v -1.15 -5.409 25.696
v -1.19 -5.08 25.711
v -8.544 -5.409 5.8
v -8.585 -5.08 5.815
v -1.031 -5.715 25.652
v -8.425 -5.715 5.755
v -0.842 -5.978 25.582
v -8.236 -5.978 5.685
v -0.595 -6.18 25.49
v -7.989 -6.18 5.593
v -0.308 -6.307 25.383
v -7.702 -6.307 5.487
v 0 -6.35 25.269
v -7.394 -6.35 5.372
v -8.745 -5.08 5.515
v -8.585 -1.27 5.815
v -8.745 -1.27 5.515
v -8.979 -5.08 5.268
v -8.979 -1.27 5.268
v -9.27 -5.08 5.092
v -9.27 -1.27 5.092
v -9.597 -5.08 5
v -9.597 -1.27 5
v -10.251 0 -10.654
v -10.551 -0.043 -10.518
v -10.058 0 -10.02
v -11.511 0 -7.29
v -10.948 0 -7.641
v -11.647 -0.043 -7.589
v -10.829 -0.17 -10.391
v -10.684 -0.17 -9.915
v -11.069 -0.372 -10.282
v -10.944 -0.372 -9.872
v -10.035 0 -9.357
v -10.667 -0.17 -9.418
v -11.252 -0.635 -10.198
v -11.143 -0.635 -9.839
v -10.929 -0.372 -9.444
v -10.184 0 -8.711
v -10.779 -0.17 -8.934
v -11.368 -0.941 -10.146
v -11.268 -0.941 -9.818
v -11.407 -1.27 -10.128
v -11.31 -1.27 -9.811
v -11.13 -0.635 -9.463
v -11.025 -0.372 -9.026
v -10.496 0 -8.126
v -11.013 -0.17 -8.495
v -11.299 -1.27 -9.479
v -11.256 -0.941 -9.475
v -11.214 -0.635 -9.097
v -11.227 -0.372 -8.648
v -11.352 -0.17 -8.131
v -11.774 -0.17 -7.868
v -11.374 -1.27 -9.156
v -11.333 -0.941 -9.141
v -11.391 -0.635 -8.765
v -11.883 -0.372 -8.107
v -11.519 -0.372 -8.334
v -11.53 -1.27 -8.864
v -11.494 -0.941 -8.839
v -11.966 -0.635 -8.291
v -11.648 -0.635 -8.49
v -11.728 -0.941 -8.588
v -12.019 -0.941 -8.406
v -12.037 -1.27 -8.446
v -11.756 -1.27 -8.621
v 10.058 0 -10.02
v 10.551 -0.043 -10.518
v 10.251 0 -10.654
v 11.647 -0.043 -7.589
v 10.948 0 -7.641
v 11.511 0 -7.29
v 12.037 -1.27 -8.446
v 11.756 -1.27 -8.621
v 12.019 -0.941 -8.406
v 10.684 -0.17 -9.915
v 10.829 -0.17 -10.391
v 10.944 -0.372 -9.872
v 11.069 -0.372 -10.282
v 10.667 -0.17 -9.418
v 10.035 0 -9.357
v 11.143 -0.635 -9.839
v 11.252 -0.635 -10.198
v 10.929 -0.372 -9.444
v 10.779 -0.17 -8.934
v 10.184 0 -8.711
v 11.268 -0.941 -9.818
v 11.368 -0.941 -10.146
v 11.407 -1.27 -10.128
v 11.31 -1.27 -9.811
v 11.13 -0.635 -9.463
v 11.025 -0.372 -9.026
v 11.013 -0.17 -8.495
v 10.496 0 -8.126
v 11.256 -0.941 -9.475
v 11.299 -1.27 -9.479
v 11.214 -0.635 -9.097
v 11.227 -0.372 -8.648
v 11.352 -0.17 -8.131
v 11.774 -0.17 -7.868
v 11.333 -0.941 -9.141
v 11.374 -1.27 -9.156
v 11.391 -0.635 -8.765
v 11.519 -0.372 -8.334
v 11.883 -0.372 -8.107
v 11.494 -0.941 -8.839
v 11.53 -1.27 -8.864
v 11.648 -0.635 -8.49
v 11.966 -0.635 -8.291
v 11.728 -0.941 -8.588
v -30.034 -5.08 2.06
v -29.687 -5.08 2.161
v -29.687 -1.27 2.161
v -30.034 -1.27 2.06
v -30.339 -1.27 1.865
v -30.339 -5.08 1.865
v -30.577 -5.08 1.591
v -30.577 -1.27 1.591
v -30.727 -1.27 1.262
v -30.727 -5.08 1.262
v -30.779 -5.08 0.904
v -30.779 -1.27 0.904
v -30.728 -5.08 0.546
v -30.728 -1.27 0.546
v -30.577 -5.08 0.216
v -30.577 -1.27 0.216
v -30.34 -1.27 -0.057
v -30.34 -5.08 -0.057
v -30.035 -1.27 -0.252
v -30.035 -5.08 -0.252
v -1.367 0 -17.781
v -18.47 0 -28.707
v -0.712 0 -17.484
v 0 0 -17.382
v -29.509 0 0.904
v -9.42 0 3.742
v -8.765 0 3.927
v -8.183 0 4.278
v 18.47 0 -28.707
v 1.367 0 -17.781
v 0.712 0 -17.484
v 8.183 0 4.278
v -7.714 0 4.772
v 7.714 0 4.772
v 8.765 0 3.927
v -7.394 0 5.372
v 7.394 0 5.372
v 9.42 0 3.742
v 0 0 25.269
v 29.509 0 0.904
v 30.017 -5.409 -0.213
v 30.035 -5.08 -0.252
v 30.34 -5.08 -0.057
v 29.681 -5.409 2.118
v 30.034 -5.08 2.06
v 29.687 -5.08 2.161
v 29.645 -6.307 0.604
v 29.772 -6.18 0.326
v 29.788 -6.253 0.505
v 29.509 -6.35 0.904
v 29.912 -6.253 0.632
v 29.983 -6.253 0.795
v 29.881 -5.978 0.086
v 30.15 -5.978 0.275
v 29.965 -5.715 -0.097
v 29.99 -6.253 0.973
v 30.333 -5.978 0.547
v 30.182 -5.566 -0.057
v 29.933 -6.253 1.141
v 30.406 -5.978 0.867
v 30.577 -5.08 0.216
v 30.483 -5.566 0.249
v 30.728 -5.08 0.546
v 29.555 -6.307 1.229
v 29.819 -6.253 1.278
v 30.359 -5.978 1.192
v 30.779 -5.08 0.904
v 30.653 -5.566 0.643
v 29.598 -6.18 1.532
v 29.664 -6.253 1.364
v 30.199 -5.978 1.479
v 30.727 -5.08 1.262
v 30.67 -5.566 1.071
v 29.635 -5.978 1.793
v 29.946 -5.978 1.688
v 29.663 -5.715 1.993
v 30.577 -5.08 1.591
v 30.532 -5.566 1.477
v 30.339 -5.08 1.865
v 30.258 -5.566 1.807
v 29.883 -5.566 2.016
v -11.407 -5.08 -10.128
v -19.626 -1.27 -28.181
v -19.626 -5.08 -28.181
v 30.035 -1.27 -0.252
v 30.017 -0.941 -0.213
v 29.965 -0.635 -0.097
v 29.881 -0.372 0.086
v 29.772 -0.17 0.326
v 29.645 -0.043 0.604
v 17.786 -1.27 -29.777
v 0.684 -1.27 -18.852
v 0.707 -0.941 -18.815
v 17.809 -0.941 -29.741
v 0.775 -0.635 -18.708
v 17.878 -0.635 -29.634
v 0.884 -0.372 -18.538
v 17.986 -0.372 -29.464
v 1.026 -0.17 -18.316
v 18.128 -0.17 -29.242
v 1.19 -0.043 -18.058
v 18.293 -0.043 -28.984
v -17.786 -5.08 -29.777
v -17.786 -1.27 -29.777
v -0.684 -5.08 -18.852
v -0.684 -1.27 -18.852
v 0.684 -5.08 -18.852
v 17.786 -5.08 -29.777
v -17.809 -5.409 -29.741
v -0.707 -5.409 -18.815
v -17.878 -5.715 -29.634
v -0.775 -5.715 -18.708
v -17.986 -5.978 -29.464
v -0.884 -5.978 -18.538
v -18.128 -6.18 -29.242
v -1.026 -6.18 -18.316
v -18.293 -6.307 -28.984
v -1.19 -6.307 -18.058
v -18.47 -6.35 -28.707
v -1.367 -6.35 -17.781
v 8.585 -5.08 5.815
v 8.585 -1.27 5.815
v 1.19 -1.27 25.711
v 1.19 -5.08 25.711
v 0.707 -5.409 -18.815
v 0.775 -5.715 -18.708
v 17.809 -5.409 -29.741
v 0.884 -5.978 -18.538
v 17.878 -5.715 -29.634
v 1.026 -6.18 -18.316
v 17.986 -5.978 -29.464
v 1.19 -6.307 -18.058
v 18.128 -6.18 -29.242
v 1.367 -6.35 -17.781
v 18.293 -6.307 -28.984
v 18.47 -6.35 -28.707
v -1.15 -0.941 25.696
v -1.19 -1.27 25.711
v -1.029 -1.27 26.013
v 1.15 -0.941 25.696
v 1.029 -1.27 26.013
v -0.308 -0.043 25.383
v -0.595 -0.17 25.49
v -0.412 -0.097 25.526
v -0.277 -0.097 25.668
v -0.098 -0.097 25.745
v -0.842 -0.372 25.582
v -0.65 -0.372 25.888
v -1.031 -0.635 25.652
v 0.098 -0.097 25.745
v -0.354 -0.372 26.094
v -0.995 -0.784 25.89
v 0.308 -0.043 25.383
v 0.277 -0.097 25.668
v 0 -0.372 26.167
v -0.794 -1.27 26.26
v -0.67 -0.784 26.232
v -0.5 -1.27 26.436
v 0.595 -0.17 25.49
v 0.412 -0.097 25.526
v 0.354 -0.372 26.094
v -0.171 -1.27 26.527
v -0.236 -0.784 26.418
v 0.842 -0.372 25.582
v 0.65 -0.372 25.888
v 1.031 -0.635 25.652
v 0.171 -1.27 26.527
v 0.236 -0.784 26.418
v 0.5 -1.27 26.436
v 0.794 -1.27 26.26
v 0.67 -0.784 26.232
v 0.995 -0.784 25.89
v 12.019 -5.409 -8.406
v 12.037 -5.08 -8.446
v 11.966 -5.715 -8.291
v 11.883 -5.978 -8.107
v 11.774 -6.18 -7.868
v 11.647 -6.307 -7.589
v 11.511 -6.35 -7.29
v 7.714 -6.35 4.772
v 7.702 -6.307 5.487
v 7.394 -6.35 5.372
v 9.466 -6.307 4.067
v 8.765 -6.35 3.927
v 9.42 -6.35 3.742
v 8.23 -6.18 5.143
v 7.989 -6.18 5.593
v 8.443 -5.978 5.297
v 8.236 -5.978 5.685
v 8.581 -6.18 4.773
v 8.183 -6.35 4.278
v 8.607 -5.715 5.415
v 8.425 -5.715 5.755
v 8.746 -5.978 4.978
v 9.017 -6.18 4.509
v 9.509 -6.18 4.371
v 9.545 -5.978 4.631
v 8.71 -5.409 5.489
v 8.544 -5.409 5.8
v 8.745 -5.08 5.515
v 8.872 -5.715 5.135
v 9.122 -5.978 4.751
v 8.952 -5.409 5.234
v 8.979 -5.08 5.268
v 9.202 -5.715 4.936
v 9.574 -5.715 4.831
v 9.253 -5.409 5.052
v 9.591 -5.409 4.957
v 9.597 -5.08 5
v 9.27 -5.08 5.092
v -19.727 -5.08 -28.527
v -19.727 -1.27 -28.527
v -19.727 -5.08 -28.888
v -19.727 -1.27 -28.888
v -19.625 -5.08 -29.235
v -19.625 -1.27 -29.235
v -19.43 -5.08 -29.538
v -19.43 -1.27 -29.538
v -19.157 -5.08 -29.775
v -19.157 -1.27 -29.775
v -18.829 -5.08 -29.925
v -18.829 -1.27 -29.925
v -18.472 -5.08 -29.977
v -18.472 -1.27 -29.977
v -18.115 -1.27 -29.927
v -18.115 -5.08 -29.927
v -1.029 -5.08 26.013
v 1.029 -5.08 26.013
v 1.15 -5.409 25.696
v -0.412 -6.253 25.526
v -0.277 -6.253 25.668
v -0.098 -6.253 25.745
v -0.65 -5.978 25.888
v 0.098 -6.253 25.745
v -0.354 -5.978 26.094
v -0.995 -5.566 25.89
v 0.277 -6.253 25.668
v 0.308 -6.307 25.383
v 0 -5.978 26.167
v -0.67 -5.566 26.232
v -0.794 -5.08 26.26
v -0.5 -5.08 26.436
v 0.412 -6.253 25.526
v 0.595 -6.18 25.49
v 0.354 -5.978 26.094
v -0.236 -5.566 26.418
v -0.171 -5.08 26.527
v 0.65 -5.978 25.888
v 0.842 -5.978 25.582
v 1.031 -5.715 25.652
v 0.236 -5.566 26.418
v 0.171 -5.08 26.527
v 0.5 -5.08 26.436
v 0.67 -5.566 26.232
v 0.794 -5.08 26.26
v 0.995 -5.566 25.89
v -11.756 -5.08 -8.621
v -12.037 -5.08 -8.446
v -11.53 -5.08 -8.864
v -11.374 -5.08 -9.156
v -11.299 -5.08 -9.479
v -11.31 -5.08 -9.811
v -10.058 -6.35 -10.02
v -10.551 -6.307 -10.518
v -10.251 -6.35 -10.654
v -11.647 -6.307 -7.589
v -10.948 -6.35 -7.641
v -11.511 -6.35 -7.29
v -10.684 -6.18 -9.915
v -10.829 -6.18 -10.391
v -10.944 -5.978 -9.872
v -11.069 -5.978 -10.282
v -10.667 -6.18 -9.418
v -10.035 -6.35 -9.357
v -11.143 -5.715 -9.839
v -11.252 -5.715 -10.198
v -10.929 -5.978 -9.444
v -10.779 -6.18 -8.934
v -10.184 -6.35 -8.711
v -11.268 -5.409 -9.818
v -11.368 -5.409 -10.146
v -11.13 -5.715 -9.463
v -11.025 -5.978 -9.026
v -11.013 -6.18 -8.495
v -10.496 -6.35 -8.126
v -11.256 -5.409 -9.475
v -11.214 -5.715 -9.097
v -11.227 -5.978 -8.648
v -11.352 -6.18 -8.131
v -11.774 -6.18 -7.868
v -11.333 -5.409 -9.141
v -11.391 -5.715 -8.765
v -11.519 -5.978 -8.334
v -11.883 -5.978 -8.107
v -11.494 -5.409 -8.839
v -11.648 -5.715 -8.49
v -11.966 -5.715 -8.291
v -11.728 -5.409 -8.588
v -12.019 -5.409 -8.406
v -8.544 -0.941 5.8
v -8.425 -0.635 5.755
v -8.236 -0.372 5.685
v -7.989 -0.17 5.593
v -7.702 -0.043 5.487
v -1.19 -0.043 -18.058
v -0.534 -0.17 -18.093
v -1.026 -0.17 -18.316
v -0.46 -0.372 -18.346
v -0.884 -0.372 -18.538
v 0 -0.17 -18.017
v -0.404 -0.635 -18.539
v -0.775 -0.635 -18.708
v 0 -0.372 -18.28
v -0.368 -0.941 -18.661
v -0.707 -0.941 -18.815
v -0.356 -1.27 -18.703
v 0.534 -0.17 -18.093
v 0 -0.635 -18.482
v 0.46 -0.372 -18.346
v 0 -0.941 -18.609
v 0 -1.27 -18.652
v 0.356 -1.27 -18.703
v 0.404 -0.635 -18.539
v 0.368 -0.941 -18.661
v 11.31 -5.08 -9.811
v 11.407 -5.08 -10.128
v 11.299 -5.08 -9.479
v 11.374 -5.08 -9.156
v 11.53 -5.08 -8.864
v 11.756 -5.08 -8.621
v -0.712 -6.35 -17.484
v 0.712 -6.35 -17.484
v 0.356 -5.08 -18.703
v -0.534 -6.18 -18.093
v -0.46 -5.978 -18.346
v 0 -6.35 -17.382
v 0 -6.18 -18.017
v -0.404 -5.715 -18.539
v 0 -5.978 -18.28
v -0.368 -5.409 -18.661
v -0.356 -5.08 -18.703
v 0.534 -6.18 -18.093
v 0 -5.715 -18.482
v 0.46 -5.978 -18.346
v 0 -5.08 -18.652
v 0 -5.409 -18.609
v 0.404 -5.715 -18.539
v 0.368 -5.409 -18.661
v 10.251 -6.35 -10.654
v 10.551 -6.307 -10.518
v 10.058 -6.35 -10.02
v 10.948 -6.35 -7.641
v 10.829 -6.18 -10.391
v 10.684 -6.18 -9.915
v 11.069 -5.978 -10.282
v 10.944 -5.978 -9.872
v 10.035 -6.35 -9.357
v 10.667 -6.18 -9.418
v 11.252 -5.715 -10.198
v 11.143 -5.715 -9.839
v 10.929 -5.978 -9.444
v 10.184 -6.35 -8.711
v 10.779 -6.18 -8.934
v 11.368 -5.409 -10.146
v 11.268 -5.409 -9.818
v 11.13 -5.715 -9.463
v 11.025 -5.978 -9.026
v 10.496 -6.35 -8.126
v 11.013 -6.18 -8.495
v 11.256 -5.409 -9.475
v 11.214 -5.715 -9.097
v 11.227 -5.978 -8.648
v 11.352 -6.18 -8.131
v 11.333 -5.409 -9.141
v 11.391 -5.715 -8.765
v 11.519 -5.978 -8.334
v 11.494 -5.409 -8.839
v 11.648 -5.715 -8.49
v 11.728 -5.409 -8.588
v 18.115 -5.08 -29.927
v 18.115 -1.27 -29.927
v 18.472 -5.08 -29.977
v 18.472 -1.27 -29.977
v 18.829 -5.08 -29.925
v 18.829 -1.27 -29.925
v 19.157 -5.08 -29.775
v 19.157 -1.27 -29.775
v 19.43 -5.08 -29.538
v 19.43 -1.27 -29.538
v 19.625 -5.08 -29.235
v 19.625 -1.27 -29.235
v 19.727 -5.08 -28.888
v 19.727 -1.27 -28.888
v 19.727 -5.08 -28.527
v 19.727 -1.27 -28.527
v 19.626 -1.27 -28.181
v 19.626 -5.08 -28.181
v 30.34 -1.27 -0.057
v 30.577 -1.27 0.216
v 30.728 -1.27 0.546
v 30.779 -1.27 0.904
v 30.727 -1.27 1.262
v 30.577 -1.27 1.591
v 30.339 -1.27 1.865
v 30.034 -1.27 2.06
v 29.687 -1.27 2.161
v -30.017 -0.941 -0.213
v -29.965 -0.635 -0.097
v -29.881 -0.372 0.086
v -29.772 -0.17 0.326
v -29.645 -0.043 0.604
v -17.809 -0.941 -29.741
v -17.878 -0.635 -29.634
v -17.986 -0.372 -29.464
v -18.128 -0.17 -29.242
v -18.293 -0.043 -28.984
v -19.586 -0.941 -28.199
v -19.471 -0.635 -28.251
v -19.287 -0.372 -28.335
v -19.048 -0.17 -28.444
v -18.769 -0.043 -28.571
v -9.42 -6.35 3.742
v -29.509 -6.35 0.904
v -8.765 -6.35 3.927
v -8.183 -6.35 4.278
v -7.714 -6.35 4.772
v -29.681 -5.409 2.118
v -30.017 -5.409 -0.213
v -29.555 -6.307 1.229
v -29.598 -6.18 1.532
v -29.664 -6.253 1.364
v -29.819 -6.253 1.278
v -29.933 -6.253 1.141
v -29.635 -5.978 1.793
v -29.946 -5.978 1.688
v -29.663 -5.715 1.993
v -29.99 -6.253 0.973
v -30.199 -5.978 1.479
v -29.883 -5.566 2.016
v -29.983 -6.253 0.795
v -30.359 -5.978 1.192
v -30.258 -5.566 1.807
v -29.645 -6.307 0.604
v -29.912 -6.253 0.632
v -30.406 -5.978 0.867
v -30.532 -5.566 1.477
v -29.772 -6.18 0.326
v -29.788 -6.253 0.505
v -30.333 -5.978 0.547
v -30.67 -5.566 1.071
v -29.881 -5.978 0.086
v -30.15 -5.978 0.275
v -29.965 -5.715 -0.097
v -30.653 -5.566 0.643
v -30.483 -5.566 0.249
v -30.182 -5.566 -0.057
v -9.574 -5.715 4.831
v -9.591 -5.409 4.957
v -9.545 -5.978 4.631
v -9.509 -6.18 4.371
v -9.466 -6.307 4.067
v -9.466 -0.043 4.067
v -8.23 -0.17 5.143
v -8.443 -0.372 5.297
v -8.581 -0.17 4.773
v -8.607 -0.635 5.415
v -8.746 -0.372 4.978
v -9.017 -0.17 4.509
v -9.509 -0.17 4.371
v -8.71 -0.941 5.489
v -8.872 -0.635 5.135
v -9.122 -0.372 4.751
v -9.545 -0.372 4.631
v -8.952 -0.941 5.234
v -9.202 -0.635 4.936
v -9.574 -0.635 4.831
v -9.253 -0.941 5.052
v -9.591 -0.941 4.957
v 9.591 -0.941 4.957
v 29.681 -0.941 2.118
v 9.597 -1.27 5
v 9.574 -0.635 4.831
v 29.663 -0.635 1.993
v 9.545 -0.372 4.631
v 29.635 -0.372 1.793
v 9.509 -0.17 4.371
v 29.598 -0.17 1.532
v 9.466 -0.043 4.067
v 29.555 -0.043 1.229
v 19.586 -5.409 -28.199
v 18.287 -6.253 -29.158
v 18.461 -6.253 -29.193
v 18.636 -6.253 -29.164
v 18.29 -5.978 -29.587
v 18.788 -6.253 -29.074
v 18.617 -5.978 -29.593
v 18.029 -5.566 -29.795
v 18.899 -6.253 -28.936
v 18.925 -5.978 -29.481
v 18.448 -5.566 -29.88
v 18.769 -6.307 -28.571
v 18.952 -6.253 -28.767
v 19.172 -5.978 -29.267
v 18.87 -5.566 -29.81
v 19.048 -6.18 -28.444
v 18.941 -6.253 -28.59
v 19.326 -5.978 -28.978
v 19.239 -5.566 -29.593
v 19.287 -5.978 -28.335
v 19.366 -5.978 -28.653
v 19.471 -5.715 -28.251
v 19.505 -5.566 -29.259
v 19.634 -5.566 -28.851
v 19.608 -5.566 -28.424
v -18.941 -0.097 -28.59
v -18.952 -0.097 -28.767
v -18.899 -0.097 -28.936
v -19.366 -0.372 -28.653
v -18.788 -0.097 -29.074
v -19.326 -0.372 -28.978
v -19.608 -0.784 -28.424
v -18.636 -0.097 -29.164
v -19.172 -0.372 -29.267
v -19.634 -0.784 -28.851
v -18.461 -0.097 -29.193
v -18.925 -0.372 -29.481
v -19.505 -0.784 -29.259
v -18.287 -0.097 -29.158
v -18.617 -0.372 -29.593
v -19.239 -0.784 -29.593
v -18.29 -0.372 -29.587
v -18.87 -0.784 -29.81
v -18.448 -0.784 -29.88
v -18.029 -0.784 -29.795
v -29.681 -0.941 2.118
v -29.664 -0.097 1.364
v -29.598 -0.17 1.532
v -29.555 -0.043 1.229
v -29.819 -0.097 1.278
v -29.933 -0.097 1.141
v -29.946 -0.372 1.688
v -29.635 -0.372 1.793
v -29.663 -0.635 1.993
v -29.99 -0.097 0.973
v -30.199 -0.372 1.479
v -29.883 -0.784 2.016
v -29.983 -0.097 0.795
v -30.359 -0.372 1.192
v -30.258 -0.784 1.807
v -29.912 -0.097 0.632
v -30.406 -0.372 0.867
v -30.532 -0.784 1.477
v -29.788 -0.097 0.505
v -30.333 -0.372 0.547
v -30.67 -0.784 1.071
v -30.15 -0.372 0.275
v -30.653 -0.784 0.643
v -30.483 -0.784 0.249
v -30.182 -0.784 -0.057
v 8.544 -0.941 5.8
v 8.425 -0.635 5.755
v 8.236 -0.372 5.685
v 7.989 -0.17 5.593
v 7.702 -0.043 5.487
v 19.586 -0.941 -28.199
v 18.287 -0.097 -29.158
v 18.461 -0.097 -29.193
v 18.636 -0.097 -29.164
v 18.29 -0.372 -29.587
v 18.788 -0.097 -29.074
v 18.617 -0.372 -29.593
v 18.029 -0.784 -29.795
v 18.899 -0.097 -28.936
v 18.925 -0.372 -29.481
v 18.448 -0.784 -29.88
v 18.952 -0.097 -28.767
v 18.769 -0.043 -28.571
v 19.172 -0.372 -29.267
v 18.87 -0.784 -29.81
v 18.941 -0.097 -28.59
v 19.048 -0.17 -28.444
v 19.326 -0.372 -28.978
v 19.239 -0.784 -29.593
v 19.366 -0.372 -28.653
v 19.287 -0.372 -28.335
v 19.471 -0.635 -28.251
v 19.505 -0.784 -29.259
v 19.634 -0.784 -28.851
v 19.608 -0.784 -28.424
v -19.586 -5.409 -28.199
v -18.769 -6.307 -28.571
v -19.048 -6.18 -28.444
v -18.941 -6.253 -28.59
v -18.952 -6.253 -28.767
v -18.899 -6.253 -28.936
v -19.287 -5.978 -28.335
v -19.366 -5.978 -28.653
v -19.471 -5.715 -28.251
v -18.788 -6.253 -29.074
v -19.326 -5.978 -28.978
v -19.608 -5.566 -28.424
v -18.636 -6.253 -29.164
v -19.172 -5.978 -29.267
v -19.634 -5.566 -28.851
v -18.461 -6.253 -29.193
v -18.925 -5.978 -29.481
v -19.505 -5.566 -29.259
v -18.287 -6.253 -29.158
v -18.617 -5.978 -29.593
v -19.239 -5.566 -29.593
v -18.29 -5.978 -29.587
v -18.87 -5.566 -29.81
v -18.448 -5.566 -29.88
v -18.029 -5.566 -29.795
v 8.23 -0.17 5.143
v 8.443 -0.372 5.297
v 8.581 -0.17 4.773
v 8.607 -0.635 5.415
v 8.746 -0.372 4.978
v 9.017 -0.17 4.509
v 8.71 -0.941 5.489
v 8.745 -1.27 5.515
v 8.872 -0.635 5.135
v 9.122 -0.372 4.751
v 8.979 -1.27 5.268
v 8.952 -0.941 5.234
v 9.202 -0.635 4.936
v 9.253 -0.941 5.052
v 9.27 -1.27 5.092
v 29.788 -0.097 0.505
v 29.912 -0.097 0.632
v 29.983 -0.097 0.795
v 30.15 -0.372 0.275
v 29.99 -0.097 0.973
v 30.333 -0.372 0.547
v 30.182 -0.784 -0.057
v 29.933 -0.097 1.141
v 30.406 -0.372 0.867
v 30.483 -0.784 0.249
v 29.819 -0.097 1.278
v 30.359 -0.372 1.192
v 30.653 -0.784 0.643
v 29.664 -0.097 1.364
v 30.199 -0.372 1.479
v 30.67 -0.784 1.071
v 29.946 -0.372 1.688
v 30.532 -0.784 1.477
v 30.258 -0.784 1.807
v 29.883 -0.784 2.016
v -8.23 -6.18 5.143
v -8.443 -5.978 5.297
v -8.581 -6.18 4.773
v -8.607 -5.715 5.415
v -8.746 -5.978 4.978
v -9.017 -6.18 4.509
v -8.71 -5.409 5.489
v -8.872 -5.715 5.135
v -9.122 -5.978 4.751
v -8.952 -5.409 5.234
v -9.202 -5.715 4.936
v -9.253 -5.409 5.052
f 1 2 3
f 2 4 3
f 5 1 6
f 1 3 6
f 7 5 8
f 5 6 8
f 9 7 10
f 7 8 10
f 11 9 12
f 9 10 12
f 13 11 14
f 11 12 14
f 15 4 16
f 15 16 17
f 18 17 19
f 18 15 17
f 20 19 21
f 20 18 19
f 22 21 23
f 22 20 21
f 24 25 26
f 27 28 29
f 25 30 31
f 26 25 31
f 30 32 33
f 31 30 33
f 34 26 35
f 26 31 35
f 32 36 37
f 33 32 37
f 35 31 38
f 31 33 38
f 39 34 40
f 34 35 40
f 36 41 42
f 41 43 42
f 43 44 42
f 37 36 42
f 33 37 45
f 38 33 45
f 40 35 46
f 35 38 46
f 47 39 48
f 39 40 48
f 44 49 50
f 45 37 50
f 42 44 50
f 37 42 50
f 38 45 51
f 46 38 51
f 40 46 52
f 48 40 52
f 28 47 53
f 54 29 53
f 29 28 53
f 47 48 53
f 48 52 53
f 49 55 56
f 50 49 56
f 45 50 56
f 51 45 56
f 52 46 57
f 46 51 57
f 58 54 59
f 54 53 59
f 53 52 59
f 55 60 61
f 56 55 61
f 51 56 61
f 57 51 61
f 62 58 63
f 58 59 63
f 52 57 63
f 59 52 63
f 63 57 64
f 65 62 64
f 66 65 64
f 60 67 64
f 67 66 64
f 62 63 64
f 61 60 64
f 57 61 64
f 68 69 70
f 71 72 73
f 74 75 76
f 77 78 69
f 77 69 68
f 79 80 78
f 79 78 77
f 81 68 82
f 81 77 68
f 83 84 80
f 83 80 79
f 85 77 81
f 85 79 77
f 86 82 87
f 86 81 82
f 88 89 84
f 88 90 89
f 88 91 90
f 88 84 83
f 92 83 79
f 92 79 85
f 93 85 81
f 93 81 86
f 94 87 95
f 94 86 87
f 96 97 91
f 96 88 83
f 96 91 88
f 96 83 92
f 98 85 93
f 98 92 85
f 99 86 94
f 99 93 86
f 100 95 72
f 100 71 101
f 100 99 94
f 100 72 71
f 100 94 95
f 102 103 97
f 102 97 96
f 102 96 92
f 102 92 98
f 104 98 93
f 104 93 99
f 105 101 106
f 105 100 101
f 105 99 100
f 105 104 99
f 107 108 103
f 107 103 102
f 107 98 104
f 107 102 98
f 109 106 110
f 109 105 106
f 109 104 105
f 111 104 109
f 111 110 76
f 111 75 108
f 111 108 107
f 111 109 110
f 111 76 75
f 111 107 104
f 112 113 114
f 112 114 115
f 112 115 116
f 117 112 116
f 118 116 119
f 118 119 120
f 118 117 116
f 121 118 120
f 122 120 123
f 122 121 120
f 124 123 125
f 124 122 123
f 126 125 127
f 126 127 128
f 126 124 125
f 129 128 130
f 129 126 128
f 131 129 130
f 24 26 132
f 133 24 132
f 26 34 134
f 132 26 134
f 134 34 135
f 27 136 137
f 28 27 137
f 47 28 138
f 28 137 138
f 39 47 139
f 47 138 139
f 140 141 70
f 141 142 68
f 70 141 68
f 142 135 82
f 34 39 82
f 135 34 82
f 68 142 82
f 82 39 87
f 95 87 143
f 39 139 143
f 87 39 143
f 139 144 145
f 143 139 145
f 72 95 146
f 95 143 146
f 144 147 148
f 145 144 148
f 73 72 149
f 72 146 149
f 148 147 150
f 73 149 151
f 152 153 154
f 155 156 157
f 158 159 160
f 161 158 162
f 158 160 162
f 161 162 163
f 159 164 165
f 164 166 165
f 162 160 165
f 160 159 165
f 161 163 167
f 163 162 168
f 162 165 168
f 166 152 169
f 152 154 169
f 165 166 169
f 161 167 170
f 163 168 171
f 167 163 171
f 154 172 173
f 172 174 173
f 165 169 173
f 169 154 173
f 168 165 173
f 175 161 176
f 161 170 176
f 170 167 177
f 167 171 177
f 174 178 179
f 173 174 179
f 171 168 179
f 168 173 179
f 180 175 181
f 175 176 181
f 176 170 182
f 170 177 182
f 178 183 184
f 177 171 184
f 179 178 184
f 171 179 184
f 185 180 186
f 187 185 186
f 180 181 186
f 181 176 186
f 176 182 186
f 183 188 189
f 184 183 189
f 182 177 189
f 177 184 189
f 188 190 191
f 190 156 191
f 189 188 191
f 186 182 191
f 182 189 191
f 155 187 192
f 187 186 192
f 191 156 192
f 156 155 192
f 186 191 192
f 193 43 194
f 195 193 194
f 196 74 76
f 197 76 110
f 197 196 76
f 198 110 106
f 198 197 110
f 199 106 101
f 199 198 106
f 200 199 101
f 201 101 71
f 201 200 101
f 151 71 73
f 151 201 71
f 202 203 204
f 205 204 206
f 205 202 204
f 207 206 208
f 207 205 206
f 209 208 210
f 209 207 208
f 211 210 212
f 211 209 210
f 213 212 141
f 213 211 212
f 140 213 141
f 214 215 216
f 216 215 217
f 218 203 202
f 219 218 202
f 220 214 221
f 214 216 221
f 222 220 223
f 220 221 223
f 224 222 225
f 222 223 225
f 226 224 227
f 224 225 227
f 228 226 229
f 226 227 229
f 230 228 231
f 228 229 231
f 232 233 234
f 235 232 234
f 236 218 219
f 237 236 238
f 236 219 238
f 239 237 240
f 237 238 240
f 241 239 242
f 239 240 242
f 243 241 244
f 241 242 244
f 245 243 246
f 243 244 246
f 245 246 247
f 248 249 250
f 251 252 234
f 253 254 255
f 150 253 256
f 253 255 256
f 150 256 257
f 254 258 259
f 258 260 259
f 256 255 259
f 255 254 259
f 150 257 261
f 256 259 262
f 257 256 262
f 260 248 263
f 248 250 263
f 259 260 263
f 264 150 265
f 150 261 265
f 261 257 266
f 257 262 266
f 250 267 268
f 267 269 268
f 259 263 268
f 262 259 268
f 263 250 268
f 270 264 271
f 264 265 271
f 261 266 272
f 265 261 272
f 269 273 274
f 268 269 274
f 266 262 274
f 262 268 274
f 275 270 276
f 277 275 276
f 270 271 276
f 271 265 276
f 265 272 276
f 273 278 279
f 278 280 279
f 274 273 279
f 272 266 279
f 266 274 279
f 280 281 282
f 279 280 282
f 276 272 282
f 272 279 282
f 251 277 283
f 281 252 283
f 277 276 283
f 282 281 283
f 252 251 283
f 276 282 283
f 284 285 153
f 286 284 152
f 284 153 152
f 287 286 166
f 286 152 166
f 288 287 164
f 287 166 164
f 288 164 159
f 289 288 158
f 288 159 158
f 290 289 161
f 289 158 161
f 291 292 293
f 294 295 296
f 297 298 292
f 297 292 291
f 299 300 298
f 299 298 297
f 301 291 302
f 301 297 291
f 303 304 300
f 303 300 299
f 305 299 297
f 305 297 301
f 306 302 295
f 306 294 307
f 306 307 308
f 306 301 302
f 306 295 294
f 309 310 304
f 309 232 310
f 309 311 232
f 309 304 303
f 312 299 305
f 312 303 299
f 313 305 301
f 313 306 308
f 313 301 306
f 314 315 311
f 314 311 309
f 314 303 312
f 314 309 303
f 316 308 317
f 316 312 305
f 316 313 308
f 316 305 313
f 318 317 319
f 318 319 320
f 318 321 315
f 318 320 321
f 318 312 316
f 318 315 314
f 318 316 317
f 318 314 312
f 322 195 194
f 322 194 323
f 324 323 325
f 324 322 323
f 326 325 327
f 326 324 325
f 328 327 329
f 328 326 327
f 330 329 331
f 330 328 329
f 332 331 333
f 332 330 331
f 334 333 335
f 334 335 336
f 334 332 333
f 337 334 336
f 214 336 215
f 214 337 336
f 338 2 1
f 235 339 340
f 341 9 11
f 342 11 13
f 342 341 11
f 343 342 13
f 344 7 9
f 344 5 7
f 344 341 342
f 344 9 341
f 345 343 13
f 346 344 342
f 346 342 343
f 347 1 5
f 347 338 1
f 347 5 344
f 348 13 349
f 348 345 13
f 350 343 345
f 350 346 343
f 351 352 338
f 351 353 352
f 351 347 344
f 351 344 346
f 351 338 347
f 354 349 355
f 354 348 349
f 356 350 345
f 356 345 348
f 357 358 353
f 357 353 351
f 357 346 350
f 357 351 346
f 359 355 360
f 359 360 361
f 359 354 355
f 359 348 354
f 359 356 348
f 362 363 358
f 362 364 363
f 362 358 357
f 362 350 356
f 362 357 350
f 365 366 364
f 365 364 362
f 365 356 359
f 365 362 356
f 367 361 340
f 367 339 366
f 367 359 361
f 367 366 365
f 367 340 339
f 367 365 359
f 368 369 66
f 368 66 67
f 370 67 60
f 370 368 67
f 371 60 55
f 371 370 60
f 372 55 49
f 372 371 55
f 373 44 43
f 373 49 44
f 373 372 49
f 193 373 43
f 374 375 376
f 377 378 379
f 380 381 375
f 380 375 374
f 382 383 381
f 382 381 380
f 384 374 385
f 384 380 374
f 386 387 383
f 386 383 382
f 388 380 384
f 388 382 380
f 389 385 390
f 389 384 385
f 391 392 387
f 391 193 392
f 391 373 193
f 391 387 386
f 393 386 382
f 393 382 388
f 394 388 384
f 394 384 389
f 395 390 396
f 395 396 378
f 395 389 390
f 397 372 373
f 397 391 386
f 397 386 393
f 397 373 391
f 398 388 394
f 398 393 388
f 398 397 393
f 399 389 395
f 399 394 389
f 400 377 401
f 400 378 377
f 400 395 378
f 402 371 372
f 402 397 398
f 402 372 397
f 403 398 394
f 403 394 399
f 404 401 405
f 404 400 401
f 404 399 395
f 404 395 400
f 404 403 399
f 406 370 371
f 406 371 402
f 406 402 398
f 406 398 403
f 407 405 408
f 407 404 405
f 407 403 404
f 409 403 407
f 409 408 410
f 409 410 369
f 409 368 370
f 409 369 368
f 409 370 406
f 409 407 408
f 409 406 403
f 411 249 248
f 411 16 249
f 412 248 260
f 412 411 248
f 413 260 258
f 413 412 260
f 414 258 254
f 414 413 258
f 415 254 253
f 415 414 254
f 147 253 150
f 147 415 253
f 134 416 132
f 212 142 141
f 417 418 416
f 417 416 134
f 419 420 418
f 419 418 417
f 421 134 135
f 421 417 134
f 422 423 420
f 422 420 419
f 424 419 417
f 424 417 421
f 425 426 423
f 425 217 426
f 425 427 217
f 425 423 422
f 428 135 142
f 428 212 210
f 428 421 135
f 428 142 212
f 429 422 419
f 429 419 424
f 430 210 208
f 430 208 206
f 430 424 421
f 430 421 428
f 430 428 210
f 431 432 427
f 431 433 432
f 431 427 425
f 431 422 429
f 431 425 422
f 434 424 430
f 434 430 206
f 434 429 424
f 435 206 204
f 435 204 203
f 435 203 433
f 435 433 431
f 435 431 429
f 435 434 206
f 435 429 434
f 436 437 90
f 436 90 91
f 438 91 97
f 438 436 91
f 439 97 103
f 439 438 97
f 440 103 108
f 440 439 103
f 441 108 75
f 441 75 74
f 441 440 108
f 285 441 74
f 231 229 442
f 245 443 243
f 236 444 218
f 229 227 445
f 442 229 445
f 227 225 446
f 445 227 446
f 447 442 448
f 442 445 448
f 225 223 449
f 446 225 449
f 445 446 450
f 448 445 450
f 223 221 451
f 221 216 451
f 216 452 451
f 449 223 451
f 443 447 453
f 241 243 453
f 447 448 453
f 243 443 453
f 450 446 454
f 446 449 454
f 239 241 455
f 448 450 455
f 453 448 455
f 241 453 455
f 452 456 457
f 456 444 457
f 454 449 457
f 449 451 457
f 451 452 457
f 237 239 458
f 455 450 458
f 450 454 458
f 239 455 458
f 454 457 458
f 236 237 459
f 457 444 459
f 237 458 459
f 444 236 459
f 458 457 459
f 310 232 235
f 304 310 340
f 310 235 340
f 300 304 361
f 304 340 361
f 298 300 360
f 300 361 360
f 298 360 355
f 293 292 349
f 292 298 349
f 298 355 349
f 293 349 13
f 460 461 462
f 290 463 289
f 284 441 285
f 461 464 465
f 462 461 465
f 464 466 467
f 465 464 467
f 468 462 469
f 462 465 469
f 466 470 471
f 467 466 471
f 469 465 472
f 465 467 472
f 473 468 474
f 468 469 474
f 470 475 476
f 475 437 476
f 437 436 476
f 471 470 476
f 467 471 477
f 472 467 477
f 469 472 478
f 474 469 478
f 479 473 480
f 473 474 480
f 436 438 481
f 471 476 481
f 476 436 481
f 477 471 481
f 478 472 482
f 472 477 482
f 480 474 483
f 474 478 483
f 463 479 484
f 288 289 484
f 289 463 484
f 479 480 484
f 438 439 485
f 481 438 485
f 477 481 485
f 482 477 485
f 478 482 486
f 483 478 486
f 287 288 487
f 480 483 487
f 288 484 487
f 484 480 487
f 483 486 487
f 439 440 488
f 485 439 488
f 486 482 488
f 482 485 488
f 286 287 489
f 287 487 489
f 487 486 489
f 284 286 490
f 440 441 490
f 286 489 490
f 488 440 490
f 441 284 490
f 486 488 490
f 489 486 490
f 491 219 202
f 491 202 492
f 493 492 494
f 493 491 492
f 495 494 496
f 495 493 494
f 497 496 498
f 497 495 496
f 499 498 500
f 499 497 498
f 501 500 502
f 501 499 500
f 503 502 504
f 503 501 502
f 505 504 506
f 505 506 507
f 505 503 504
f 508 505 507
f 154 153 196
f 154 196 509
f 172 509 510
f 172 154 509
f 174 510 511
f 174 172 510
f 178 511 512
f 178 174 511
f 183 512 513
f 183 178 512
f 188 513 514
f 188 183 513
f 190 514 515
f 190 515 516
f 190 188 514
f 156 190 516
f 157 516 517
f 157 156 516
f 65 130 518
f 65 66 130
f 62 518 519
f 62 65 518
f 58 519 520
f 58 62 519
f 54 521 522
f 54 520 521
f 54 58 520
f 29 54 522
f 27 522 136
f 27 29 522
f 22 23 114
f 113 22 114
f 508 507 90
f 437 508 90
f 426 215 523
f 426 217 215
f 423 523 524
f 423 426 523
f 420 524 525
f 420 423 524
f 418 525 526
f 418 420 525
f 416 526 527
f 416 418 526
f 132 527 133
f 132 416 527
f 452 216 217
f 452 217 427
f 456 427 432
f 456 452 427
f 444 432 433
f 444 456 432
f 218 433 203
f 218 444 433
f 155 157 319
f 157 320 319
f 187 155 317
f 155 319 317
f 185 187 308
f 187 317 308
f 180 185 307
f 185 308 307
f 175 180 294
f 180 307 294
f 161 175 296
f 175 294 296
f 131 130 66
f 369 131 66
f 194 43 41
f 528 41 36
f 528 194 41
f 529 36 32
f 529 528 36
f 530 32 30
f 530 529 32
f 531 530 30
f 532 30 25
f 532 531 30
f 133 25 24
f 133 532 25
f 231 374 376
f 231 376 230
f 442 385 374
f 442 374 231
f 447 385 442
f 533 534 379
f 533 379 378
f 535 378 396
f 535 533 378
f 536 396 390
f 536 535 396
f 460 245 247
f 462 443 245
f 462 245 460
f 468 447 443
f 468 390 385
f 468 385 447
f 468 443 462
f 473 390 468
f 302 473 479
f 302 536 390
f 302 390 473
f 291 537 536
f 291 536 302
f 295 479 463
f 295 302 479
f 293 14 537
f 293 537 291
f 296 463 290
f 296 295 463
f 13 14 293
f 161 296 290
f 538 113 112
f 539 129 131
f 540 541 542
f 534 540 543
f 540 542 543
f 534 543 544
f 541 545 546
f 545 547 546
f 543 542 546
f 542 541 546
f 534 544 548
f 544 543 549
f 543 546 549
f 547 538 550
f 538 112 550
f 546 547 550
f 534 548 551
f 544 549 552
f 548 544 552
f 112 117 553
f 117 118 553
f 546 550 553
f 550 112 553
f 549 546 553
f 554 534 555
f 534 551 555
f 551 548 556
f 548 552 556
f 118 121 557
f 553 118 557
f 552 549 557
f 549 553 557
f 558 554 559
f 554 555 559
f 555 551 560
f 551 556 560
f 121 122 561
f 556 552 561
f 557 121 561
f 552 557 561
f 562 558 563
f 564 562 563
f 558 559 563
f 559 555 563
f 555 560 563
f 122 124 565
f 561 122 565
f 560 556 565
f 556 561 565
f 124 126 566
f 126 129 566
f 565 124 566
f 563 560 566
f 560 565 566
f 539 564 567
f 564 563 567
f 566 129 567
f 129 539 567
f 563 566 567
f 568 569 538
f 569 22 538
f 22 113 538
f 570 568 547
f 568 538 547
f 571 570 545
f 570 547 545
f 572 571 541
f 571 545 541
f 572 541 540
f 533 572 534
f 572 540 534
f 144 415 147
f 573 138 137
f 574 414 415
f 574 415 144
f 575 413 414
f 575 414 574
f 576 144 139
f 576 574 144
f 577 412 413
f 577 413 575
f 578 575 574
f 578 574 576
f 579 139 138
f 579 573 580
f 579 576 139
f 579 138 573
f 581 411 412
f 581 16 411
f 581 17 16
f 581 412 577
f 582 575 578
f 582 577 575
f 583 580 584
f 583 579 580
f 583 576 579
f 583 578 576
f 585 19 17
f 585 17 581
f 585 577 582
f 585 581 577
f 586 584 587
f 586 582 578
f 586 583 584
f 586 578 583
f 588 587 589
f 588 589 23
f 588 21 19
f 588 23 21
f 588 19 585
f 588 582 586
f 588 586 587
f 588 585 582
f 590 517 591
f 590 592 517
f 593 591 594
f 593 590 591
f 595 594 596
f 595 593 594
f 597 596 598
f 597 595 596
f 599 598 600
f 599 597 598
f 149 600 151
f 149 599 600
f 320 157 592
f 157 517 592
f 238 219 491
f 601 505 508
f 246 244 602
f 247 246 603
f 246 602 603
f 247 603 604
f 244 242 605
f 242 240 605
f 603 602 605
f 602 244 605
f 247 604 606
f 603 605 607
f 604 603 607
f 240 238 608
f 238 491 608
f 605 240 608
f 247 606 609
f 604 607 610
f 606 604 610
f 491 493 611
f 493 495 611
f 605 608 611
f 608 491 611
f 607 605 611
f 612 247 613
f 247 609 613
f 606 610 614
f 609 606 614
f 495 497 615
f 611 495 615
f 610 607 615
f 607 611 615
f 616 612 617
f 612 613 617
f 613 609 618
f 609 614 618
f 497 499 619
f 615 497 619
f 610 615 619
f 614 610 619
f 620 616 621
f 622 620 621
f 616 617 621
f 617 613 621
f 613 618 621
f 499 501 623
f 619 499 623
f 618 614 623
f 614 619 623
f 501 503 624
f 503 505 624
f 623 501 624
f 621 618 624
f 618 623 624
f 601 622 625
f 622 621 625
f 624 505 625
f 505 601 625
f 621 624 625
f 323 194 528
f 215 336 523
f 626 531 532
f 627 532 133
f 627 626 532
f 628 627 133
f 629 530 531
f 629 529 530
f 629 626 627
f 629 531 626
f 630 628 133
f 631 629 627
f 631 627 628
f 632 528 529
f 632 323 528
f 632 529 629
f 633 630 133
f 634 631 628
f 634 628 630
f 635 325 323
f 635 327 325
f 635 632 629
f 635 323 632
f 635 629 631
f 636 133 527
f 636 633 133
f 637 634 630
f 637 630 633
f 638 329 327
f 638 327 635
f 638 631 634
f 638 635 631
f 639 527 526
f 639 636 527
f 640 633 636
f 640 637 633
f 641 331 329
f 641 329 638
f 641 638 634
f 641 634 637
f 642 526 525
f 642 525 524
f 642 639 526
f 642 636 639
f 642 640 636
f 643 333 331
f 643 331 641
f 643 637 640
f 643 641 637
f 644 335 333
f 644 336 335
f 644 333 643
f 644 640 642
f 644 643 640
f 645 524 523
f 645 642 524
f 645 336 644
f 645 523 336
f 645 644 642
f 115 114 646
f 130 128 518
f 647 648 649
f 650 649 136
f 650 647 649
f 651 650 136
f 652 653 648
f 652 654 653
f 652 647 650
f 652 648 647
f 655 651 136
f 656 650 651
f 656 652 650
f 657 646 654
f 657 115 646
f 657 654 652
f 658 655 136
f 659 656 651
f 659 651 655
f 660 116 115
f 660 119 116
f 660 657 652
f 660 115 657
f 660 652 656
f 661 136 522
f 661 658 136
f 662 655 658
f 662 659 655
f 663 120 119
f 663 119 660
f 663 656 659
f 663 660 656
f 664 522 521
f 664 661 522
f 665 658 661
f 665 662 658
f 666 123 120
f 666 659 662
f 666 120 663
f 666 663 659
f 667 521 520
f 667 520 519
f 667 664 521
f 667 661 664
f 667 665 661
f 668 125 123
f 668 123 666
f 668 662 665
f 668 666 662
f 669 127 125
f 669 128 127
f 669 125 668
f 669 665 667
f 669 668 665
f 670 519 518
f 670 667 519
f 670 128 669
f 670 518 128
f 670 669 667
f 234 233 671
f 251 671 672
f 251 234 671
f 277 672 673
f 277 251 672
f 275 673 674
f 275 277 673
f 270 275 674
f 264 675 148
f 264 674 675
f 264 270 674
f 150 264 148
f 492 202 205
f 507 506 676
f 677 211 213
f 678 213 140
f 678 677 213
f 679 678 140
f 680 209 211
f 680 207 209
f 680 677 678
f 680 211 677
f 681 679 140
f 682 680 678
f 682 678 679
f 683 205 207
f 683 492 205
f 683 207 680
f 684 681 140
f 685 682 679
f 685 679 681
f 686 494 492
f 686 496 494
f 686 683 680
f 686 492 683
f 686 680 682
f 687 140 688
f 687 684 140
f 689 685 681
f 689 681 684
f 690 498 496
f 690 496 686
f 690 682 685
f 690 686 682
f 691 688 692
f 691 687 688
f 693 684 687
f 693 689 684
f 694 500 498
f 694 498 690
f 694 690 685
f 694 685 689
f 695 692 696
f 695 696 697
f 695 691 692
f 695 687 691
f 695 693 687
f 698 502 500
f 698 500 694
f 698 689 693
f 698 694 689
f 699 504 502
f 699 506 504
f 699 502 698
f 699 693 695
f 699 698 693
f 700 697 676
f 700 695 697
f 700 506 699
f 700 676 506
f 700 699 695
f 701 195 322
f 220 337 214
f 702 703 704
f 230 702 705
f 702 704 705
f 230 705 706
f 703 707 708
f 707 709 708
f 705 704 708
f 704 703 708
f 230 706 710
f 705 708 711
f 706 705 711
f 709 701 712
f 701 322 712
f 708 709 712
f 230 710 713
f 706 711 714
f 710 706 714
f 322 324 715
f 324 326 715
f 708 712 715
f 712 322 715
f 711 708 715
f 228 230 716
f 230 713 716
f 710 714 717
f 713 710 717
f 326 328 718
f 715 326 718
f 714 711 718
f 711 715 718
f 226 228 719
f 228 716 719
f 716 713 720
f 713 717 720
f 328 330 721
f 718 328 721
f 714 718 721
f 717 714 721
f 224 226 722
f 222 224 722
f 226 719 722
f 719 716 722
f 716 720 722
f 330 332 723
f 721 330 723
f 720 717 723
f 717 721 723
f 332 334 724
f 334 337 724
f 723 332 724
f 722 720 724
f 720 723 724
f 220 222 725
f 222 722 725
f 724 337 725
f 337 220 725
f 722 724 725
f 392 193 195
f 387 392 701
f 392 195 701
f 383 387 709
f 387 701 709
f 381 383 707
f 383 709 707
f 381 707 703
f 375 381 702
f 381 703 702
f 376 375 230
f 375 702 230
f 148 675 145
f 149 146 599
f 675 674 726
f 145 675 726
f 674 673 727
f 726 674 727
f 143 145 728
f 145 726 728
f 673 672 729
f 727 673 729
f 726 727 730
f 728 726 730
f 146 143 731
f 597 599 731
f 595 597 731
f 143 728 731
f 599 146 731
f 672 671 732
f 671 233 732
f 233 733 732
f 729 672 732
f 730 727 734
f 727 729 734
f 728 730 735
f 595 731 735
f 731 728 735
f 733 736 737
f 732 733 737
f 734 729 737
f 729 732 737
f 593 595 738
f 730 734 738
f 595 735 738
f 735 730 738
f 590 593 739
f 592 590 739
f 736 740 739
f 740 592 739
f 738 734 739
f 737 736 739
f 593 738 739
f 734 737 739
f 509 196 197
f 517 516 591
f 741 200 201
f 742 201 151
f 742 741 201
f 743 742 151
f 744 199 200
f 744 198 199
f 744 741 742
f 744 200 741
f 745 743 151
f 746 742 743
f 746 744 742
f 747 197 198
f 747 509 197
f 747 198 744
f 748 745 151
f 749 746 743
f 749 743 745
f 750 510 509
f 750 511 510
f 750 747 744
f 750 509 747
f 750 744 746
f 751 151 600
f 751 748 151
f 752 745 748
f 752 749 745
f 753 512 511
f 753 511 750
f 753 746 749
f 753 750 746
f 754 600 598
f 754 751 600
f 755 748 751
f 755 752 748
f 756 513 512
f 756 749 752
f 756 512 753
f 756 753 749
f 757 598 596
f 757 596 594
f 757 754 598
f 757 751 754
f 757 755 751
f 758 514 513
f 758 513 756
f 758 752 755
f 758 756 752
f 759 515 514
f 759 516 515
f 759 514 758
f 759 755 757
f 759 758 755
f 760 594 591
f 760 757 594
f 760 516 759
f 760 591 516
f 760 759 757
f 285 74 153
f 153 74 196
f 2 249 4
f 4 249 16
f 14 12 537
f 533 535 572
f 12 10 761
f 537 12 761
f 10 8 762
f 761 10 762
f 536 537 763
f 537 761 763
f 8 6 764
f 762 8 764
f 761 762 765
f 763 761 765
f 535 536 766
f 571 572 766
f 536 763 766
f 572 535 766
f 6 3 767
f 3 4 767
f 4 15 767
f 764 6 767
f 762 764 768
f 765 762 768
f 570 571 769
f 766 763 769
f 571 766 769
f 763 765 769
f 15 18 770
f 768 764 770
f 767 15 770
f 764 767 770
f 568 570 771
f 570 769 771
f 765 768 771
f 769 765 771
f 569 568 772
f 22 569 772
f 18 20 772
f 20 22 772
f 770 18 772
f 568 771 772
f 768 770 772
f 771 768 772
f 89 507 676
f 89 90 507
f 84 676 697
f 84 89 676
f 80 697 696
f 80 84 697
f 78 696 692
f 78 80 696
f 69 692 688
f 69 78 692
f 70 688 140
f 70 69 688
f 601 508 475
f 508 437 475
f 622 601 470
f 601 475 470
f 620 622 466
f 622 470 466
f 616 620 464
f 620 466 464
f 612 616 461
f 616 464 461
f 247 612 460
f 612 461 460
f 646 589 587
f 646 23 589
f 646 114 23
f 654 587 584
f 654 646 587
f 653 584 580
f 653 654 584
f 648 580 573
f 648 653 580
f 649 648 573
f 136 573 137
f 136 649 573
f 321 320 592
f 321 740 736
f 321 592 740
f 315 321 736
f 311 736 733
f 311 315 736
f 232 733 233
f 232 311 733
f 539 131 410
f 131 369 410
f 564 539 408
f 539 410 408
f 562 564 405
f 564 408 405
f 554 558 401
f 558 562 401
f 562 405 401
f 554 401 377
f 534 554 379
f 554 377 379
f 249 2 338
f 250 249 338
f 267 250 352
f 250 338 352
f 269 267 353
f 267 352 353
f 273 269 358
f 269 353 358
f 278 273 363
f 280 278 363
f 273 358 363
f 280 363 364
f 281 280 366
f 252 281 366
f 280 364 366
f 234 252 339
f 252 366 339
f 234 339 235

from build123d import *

# Parameters (mm, degrees)
F1_DEPTH = 6.35
F2_R     = 1.27


with BuildPart() as f1:
    # F0 (on Front) → F1 (new body)
    with BuildSketch(Plane.XZ):
        Polygon((0, 28.9144045194), (-8.8481841409, 5.1053802343), (-33.9983782601, 1.5518276782), (-10.8810784623, -8.9719762946), (-21.404882435, -32.0892760924), (0, -18.4148105473), align=None)
        Polygon((8.8481841409, 5.1053802343), (0, 28.9144045194), (0, -18.4148105473), (21.404882435, -32.0892760924), (10.8810784623, -8.9719762946), (33.9983782601, 1.5518276782), align=None)
    extrude(amount=F1_DEPTH)

    # F2
    f2_edges = [f1.edges().sort_by_distance(p)[0] for p in [
        (-10.702441, 0, -25.252043),
        (-10.702441, -6.35, -25.252043),
        (10.702441, 0, -25.252043),
        (10.702441, -6.35, -25.252043),
        (16.14298, 0, -20.530626),
        (16.14298, -6.35, -20.530626),
        (22.439728, -6.35, -3.710074),
        (22.439728, 0, -3.710074),
        (21.423281, -6.35, 3.328604),
        (21.423281, 0, 3.328604),
        (0, -3.175, 28.914405),
        (-8.848184, -3.175, 5.10538),
        (-4.424092, 0, 17.009892),
        (-4.424092, -6.35, 17.009892),
        (8.848184, -3.175, 5.10538),
        (4.424092, 0, 17.009892),
        (4.424092, -6.35, 17.009892),
        (10.881078, -3.175, -8.971976),
        (33.998378, -3.175, 1.551828),
        (21.404882, -3.175, -32.089276),
        (0, -3.175, -18.414811),
        (-10.881078, -3.175, -8.971976),
        (-21.404882, -3.175, -32.089276),
        (-16.14298, 0, -20.530626),
        (-16.14298, -6.35, -20.530626),
        (-33.998378, -3.175, 1.551828),
        (-21.423281, 0, 3.328604),
        (-21.423281, -6.35, 3.328604),
        (-22.439728, 0, -3.710074),
        (-22.439728, -6.35, -3.710074),
    ]]
    fillet(f2_edges, radius=F2_R)


solid = f1.part
